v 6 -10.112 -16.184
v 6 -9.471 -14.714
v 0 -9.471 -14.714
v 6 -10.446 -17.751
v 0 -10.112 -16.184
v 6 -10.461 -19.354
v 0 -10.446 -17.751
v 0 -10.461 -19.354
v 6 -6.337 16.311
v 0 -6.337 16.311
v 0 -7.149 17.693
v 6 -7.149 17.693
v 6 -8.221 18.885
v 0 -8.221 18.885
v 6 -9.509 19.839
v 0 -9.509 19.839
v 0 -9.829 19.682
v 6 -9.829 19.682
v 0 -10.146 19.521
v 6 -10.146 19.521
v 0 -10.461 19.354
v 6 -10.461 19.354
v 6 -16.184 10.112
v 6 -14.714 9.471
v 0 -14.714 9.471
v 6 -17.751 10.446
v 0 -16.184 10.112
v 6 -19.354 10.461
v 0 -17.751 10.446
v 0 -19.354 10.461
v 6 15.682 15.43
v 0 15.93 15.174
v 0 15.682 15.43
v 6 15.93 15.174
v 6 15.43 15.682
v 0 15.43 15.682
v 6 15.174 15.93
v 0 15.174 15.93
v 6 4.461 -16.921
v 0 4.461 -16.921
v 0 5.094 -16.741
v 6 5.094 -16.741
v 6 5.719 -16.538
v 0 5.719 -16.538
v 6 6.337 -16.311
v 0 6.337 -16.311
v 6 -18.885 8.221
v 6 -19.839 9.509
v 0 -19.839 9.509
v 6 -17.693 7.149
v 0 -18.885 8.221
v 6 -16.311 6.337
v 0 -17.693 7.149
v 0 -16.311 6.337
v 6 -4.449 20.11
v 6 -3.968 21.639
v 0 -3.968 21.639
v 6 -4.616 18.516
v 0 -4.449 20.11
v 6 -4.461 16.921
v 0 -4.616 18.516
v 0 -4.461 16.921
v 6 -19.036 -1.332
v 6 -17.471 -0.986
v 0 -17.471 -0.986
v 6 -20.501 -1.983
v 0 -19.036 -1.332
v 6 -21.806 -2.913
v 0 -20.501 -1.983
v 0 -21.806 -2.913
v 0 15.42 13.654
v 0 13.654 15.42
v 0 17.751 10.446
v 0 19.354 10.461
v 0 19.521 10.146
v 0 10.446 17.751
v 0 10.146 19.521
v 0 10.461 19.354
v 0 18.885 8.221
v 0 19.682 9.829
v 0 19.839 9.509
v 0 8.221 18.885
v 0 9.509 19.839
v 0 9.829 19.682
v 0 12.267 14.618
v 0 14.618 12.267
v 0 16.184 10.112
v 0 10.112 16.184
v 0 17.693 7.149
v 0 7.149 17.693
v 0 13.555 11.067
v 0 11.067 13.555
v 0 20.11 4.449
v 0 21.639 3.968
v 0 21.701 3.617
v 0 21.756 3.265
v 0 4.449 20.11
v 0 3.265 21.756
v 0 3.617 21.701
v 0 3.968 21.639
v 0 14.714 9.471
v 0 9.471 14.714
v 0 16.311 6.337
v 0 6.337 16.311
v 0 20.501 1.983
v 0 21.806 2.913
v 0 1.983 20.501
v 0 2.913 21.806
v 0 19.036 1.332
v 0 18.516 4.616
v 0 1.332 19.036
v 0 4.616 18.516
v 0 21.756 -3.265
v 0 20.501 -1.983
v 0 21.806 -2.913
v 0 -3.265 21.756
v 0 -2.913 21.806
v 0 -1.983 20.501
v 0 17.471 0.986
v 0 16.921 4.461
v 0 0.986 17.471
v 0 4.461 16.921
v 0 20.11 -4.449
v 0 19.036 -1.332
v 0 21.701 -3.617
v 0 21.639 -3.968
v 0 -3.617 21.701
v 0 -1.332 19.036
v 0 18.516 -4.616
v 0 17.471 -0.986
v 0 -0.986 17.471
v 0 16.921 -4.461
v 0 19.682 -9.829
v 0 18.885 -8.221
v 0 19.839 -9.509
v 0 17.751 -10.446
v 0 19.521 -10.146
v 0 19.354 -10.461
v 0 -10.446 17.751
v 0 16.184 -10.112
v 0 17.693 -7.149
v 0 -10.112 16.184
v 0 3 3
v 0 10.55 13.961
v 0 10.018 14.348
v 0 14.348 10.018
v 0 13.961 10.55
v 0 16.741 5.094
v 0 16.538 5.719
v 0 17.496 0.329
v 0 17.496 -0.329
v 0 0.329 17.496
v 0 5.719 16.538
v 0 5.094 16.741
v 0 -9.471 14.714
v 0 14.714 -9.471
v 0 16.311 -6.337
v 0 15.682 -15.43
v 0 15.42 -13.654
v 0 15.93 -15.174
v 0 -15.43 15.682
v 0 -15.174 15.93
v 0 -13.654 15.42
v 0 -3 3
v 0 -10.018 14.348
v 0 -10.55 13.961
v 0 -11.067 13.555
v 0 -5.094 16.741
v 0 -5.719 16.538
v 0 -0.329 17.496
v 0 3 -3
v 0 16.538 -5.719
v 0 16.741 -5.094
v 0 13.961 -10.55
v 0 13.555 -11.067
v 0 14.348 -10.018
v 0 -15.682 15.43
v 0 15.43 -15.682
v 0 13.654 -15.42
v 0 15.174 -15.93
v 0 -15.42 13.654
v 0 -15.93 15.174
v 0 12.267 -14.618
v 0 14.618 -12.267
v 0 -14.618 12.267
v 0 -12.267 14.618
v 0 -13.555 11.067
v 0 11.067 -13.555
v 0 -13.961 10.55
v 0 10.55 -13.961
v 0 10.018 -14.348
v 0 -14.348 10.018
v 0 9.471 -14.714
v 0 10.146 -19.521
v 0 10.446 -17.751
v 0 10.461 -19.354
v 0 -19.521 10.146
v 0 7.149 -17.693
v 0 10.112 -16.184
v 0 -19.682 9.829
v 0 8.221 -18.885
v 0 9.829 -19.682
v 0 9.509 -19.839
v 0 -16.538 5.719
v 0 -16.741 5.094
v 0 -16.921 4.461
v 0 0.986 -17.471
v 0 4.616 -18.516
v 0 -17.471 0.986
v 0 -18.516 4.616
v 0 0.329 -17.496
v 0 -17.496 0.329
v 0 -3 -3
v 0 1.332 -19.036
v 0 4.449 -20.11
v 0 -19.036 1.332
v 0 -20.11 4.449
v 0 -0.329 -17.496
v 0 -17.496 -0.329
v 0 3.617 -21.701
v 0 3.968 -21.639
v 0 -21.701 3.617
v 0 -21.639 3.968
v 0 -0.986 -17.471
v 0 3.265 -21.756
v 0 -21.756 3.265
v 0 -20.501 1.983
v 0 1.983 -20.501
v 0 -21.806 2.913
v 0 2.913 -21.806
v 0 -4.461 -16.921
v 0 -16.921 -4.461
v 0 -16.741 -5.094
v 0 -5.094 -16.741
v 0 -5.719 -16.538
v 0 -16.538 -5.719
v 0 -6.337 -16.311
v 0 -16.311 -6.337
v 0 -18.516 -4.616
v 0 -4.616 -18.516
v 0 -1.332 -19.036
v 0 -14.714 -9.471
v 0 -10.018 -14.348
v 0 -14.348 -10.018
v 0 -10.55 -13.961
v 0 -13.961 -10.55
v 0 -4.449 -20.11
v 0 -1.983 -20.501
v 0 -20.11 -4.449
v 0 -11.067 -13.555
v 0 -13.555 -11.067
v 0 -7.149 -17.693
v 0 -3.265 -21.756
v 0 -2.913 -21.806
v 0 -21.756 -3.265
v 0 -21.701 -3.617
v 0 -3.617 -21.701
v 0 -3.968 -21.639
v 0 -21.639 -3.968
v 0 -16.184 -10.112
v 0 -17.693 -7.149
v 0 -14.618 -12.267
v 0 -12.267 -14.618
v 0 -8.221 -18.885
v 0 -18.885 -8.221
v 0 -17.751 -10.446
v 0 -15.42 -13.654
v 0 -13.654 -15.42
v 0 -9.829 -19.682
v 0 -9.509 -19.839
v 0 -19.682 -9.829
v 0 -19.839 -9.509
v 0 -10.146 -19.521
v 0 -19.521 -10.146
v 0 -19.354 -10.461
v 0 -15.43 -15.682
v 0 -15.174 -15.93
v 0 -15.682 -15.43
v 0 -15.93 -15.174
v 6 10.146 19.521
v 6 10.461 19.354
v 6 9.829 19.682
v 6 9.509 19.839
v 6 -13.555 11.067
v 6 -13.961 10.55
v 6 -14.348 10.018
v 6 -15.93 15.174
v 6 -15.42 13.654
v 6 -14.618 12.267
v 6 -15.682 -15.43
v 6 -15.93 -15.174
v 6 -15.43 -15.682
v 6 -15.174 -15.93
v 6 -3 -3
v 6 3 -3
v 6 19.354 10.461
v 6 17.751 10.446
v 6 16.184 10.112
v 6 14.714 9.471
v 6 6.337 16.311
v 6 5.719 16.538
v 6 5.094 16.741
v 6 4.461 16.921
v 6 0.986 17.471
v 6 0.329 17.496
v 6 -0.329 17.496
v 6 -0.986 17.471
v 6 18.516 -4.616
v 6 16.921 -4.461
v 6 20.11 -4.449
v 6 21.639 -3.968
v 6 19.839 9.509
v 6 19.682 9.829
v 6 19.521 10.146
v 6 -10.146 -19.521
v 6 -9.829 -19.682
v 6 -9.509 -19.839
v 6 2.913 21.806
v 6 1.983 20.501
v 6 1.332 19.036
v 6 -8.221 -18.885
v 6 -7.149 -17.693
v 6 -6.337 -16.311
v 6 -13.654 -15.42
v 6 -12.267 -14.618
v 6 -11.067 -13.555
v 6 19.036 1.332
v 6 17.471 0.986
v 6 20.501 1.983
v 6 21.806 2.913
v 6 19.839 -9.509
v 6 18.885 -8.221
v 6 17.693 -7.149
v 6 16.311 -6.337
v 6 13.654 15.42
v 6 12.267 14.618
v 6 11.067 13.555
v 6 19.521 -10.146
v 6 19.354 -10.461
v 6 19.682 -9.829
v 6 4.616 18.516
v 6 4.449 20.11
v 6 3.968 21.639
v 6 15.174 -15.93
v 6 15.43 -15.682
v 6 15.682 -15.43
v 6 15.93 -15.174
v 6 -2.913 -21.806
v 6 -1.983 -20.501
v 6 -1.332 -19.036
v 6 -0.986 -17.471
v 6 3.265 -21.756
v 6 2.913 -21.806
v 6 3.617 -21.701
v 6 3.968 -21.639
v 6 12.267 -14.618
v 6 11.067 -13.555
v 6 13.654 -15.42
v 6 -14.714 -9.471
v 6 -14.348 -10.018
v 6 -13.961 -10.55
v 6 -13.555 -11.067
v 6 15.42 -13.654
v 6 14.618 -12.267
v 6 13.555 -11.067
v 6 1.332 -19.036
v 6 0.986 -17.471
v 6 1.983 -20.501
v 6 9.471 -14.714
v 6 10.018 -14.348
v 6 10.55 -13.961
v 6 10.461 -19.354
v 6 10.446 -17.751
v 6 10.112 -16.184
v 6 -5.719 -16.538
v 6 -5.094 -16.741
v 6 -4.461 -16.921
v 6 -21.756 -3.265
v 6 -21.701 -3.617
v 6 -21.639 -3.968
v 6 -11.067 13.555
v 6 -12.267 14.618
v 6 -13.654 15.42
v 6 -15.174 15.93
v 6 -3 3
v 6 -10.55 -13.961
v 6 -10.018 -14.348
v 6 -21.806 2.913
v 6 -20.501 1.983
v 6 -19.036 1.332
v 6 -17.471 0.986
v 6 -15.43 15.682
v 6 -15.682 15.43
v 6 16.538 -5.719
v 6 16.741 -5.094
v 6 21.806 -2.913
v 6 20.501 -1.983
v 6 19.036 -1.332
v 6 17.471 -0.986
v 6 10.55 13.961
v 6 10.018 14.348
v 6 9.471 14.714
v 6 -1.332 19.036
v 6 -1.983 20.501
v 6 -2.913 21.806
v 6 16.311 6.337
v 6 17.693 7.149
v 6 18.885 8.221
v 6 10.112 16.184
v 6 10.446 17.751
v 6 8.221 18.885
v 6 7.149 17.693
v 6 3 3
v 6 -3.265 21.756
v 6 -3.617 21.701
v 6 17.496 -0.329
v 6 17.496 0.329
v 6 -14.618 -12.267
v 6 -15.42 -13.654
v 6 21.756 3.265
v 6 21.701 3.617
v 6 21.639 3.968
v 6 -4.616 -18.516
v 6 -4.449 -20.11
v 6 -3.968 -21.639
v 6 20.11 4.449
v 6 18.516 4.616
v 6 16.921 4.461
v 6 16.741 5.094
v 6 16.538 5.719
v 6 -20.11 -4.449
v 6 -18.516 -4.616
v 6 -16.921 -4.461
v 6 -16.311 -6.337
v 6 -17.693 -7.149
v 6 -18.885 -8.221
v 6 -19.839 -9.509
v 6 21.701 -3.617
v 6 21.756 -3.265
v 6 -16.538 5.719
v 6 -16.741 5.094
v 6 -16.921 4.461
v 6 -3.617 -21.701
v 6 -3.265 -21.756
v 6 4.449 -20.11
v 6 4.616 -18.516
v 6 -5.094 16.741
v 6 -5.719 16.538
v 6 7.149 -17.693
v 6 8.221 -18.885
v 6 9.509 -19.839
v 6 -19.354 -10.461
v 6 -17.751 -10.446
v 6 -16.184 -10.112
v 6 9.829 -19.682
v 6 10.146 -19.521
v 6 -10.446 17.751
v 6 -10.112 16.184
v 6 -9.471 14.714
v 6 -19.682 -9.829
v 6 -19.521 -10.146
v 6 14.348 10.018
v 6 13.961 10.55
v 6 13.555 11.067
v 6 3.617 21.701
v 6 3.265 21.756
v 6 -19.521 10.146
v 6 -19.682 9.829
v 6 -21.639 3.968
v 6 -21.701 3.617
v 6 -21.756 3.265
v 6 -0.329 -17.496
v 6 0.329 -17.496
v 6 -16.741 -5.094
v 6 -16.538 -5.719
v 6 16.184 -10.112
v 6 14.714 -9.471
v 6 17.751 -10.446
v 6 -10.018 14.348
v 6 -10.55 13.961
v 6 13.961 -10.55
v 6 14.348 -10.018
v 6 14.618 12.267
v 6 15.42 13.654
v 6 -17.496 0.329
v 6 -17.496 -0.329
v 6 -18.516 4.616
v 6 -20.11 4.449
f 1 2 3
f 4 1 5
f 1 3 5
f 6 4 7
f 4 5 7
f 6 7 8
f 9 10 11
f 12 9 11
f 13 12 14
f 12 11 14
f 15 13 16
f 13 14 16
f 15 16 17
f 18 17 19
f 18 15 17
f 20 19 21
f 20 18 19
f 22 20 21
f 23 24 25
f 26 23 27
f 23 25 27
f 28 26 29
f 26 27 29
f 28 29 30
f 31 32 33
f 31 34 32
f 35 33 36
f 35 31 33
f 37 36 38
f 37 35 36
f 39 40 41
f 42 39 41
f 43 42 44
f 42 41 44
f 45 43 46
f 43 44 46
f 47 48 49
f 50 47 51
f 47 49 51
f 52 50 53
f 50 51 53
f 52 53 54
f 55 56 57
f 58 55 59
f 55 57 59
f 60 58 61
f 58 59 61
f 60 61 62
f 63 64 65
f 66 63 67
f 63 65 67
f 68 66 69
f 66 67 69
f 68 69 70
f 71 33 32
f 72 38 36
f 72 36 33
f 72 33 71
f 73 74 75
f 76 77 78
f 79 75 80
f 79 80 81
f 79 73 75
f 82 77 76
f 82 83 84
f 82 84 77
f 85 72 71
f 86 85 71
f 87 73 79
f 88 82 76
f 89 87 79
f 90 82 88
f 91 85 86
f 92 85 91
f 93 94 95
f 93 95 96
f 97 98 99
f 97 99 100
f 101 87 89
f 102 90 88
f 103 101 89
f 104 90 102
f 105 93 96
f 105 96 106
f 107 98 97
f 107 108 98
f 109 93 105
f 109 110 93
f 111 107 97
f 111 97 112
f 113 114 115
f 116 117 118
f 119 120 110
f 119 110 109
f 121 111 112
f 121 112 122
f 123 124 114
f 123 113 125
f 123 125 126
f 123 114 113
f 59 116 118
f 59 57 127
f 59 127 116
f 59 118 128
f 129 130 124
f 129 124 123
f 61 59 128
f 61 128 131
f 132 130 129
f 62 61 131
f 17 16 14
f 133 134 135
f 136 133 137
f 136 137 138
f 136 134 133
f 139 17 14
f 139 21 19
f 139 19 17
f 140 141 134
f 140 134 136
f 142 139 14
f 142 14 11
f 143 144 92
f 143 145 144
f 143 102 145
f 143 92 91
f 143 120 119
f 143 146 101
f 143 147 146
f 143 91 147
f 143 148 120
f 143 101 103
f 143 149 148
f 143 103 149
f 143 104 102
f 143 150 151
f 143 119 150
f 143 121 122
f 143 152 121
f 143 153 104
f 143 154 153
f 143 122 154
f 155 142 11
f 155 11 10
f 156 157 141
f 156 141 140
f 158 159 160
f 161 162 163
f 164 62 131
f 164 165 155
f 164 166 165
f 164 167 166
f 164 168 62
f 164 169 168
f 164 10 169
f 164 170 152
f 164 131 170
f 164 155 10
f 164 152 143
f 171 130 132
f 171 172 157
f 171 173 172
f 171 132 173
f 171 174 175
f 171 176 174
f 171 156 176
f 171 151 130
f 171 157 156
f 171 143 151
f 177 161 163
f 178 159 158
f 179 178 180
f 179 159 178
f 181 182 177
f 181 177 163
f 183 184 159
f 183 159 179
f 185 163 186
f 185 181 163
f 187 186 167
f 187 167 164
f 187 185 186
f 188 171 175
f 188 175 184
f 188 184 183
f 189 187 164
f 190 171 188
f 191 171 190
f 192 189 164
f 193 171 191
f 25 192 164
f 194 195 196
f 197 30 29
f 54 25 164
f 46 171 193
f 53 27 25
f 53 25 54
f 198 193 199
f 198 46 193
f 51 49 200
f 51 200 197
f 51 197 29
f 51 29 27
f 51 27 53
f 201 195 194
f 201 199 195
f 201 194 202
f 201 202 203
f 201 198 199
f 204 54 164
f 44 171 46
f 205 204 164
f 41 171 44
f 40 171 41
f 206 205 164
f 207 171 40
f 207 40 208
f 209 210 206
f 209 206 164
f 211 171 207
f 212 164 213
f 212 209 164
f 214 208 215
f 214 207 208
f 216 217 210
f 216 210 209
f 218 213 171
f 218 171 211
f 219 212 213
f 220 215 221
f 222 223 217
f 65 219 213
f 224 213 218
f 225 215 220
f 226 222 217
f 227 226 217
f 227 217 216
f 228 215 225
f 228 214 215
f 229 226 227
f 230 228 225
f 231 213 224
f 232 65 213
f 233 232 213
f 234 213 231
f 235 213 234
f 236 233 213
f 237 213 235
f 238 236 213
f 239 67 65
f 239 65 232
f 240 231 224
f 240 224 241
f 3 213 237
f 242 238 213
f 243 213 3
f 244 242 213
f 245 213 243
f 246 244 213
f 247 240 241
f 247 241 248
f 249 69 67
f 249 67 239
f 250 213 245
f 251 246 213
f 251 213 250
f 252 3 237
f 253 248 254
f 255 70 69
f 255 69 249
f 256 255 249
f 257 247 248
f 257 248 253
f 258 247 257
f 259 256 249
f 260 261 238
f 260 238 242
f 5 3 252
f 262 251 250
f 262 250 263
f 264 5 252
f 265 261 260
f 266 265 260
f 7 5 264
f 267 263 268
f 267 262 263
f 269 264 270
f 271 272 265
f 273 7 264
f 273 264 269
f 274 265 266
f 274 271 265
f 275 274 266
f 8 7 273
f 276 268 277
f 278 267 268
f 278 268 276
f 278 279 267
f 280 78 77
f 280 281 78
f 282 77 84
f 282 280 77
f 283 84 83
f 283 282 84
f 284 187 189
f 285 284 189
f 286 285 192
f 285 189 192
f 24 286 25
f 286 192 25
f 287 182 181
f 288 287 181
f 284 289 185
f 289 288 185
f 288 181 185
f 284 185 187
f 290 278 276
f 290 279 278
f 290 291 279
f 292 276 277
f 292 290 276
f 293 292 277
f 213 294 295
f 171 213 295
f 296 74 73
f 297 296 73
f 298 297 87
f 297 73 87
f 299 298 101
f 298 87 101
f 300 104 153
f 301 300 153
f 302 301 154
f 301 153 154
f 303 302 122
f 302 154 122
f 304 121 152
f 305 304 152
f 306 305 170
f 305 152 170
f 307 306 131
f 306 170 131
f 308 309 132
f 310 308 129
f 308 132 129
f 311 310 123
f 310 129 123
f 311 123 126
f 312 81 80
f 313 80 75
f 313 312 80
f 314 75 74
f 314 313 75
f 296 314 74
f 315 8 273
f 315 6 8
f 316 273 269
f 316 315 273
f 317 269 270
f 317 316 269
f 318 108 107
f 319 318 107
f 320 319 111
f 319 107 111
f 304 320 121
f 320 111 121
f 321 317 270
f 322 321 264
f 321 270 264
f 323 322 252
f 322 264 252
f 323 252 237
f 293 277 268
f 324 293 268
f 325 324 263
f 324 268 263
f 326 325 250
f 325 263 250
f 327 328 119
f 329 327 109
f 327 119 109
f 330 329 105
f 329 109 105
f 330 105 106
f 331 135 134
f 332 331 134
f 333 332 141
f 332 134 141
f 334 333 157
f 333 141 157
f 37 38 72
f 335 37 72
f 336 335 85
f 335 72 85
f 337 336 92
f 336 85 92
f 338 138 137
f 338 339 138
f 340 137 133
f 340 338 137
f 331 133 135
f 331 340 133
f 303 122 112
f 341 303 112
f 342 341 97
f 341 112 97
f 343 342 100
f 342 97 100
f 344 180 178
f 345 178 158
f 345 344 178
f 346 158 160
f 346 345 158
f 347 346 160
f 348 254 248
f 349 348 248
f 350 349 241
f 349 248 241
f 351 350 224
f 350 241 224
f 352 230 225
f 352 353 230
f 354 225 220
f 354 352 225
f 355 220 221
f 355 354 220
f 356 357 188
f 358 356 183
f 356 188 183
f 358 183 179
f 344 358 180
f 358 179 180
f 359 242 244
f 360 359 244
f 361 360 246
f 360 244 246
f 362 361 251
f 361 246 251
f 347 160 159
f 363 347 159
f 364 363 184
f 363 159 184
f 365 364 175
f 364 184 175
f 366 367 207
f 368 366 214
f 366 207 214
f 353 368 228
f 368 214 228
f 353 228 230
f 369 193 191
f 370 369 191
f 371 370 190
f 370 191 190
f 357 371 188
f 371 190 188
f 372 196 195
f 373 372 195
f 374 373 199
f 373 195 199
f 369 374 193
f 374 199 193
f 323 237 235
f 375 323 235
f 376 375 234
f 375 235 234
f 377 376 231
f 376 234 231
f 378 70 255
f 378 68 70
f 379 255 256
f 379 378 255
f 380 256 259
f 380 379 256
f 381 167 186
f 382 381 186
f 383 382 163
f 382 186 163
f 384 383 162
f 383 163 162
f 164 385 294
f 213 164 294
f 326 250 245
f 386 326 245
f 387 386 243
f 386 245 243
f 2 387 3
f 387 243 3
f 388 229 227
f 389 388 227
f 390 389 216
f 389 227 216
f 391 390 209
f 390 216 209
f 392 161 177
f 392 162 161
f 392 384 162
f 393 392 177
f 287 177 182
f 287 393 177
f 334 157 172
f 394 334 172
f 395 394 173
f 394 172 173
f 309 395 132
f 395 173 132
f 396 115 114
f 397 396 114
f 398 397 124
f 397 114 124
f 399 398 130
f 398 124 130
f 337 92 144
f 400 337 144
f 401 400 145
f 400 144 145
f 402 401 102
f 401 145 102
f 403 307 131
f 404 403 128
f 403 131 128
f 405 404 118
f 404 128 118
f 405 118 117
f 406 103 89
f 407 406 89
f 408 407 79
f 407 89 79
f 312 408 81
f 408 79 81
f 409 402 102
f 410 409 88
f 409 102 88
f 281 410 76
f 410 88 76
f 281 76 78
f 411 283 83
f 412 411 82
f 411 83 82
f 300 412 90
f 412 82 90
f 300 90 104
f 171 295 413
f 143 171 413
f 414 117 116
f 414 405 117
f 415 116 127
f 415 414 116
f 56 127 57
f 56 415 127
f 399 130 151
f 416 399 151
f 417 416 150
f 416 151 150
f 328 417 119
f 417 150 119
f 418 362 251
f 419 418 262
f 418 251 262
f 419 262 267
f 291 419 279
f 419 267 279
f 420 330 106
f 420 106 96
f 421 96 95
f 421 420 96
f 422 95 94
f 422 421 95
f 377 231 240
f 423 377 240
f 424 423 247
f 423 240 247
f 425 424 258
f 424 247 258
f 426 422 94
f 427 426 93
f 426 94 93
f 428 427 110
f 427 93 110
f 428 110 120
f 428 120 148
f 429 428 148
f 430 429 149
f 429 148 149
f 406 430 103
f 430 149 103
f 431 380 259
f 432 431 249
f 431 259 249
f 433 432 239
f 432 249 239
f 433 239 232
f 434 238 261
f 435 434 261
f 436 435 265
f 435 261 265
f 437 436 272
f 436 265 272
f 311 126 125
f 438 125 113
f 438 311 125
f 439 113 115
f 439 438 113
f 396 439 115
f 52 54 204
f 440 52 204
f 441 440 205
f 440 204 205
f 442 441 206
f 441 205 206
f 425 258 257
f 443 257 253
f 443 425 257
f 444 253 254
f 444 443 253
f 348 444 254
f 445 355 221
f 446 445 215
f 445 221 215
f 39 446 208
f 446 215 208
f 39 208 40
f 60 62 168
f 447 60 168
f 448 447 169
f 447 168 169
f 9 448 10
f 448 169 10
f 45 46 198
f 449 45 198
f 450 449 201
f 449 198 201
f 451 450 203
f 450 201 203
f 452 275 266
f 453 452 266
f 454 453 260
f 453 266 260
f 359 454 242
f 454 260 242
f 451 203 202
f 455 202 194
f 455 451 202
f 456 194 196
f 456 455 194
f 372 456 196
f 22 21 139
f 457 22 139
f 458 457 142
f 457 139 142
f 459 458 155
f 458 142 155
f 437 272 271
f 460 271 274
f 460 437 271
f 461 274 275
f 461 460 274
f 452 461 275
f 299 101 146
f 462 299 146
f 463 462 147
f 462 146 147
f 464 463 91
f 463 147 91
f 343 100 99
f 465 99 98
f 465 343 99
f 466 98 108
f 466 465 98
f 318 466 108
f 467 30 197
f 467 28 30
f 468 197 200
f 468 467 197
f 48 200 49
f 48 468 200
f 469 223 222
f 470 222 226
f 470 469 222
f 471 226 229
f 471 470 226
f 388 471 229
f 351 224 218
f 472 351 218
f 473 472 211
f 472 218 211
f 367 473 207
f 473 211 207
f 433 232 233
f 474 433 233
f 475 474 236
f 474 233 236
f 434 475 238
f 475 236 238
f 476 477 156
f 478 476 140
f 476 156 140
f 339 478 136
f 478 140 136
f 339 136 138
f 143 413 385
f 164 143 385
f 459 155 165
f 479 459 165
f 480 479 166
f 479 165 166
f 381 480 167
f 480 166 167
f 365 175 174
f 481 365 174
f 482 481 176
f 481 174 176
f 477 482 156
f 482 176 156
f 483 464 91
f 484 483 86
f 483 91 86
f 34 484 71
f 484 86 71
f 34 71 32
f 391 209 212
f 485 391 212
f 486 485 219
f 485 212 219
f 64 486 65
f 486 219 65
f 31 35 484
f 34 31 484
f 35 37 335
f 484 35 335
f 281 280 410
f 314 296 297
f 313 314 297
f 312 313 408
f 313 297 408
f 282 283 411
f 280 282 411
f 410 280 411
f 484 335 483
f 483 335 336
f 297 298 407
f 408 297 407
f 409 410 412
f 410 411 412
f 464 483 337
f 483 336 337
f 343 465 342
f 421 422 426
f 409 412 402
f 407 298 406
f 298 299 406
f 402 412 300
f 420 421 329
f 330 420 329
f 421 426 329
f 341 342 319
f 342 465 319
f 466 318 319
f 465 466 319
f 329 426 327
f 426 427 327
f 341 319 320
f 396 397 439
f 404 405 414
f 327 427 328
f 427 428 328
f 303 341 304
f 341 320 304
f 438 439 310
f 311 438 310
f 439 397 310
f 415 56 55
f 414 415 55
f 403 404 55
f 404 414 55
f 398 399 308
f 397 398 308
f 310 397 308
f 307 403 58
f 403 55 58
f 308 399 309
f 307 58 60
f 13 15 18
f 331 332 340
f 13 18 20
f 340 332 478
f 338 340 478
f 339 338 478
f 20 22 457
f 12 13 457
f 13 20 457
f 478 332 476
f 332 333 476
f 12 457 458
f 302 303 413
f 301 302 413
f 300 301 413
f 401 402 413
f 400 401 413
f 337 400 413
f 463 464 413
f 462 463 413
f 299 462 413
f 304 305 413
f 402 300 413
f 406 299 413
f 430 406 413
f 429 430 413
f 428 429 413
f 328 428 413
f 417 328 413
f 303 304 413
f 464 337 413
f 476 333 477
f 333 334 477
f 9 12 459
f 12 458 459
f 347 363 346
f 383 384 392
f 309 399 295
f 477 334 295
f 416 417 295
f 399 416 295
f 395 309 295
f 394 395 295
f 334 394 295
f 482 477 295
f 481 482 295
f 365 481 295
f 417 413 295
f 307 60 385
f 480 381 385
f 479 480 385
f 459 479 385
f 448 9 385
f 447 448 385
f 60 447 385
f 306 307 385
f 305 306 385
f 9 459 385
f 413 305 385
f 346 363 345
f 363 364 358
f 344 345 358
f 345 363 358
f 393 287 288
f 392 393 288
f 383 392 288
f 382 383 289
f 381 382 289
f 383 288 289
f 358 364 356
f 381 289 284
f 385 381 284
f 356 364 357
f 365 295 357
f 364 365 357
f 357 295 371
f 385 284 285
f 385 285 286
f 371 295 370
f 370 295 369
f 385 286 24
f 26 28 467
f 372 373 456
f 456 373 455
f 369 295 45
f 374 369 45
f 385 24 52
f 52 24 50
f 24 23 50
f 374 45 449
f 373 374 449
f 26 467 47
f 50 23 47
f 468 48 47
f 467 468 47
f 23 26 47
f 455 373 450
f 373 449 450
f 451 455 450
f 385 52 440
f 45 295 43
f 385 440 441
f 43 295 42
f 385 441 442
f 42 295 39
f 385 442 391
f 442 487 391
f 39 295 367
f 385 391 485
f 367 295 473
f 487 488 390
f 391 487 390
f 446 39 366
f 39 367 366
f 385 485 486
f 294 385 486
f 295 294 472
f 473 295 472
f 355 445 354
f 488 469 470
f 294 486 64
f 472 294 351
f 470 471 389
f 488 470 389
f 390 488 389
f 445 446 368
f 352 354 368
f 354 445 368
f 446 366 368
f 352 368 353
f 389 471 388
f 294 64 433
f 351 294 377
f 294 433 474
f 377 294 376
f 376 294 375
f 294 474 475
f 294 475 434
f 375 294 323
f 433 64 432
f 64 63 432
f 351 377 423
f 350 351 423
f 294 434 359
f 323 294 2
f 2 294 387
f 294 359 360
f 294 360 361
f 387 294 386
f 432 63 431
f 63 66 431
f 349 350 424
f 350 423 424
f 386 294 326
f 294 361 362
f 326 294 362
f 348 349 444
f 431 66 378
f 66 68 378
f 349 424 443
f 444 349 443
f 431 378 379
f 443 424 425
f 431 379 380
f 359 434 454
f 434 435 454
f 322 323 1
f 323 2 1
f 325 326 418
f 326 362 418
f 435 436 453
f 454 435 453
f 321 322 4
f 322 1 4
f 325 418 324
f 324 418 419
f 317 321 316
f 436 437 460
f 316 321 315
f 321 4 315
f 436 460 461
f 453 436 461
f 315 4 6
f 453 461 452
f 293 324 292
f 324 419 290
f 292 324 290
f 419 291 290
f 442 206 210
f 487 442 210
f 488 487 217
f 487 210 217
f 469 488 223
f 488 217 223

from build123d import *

# Parameters (mm, degrees)
BASPROSKE_W           = 6
BASPROSKE_H           = 22
TOOTHCUT_DEPTH        = 32.685959036
TEETHCUTS_COUNT       = 20
TEETHCUTS_ANGLE       = 342
BORSKE_R              = 0.5
BORE_DEPTH            = 50.0000508
CORTAR_EXTRUIR1_DEPTH = 10


with BuildPart() as part:
    # BasProSke → Base-Revolve (revolve)
    with BuildSketch(Plane(origin=(0, 0, 0), x_dir=(1, 0, 0), z_dir=(0, 1, 0)), mode=Mode.PRIVATE) as base_revolve_sk:
        with Locations((3, 11)):
            Rectangle(BASPROSKE_W, BASPROSKE_H)
    revolve(base_revolve_sk.sketch.rotate(Axis((-10, 0, 0), (1, 0, 0)), 180), axis=Axis((-10, 0, 0), (1, 0, 0)))

    # TooCutSke → ToothCut (cut, through all)
    with BuildSketch(Plane(origin=(0, 0, 0), x_dir=(0, 0, -1), z_dir=(1, 0, 0))):
        with BuildLine():
            ThreePointArc((0.986171591, 17.471189616), (0, 17.499), (-0.986171591, 17.471189616))
            ThreePointArc((-0.986171591, 17.471189616), (-1.626916196, 19.798789858), (-2.932850173, 21.829260982))
            ThreePointArc((-2.932850173, 21.829260982), (0, 22.0254), (2.932850173, 21.829260982))
            ThreePointArc((2.932850173, 21.829260982), (1.626916196, 19.798789858), (0.986171591, 17.471189616))
        make_face()
    toothcut = extrude(amount=TOOTHCUT_DEPTH, mode=Mode.SUBTRACT)

    # TeethCuts: ToothCut ×20 about axis
    teethcuts_axis = Axis((-10, 0, 0), (1, 0, 0))
    for i in range(1, TEETHCUTS_COUNT):
        add(toothcut.rotate(teethcuts_axis, i * TEETHCUTS_ANGLE / (TEETHCUTS_COUNT - 1)), mode=Mode.SUBTRACT)

    # BorSke → Bore (cut, symmetric)
    with BuildSketch(Plane(origin=(0, 0, 0), x_dir=(0, 0, -1), z_dir=(1, 0, 0))):
        with Locations(Location((0, 0, 0), (0, 0, 180))):
            Circle(BORSKE_R)
    extrude(amount=BORE_DEPTH, both=True, mode=Mode.SUBTRACT)

    # Croquis1 → Cortar-Extruir1 (cut)
    with BuildSketch(Plane(origin=(6, 0, 0), x_dir=(0, 0, -1), z_dir=(1, 0, 0))):
        Polygon((0, 3), (-3, 3), (-3, -3), (3, -3), (3, 3), align=None)
    extrude(amount=-CORTAR_EXTRUIR1_DEPTH, mode=Mode.SUBTRACT)


solid = part.part
